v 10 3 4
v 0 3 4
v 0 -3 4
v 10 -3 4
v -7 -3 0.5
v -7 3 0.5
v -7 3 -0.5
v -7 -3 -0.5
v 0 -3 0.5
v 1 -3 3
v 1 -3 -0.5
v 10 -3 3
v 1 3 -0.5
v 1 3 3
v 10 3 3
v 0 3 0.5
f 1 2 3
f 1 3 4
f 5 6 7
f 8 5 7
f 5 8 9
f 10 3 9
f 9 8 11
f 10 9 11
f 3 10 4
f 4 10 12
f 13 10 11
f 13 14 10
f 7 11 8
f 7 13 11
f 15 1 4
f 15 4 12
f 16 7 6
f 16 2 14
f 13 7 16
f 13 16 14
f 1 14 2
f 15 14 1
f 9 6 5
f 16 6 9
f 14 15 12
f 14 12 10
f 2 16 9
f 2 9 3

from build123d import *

# Parameters (mm, degrees)
SKETCH1_W           = 7
SKETCH1_H           = 1
BOSS_EXTRUDE1_DEPTH = 3


with BuildPart() as part:
    # Sketch1 → Boss-Extrude1 (new body, symmetric)
    with BuildSketch(Plane(origin=(0, 0, 0), x_dir=(1, 0, 0), z_dir=(0, 1, 0))):
        with Locations((-3.5, 0)):
            Rectangle(SKETCH1_W, SKETCH1_H)
        Polygon((1, 0.5), (0, 0.5), (0, -0.5), (0, -4), (10, -4), (10, -3), (1, -3), align=None)
    extrude(amount=BOSS_EXTRUDE1_DEPTH, both=True)


solid = part.part
